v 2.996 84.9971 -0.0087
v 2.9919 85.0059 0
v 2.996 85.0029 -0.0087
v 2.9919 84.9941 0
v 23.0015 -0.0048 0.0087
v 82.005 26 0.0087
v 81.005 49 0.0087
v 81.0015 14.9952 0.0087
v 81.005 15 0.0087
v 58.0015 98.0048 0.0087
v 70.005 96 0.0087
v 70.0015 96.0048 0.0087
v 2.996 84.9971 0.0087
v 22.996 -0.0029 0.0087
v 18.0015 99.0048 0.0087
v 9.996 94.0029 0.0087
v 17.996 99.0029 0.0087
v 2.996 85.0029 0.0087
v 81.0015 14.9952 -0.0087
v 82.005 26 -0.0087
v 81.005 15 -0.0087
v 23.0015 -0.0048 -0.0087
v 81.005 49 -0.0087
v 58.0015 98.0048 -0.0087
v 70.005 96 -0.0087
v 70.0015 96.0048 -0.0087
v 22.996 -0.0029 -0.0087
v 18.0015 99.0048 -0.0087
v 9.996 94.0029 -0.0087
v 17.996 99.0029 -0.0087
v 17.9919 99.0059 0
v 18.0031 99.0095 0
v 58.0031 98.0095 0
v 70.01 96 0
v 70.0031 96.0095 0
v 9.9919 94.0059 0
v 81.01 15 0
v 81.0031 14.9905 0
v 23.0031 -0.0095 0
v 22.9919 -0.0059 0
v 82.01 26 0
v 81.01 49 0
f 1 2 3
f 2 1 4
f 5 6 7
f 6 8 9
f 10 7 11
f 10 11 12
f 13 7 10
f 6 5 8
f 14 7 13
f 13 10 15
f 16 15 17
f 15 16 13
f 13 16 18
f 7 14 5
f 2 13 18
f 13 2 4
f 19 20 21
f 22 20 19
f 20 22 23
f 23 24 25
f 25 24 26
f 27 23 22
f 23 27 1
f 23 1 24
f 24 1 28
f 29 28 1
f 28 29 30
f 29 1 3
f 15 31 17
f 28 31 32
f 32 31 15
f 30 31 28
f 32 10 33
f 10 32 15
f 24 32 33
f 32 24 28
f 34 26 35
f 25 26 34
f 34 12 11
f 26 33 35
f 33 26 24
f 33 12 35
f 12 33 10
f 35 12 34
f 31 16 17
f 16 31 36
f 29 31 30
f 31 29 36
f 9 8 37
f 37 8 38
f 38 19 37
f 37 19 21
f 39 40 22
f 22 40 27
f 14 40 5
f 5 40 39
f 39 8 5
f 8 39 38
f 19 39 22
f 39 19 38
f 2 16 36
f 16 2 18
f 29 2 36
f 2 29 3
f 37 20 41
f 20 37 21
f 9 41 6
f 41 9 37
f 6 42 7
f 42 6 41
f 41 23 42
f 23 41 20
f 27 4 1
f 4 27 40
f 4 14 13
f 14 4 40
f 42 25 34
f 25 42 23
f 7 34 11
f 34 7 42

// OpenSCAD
color([0.3519350680925015,0.6477014615427978,0.14125726454845833]) hull(){
    translate([18,58]) sphere(0.01);
    translate([6,84]) sphere(0.01);
    translate([3,85]) sphere(0.01);
}
color([0.23013900541024712,0.8285218163248013,0.9603761550286747]) hull(){
    translate([18,58]) sphere(0.01);
    translate([6,84]) sphere(0.01);
    translate([16,79]) sphere(0.01);
}
color([0.6050710034948523,0.017553655236826726,0.43262871278032167]) hull(){
    translate([18,58]) sphere(0.01);
    translate([18,24]) sphere(0.01);
    translate([26,51]) sphere(0.01);
}
color([0.2571490251669072,0.4480229944680496,0.14517873337393172]) hull(){
    translate([18,58]) sphere(0.01);
    translate([18,24]) sphere(0.01);
    translate([3,85]) sphere(0.01);
}
color([0.8405131005933094,0.9776834869331054,0.10300019528175153]) hull(){
    translate([18,58]) sphere(0.01);
    translate([26,51]) sphere(0.01);
    translate([30,57]) sphere(0.01);
}
color([0.998153073210626,0.8535026464000083,0.6855970549077809]) hull(){
    translate([18,58]) sphere(0.01);
    translate([30,57]) sphere(0.01);
    translate([16,79]) sphere(0.01);
}
color([0.7995005100691247,0.34047238184459006,0.1286635278612125]) hull(){
    translate([58,98]) sphere(0.01);
    translate([50,93]) sphere(0.01);
    translate([39,98]) sphere(0.01);
}
color([0.6020598448119898,0.9167847797194366,0.02081986636819022]) hull(){
    translate([58,98]) sphere(0.01);
    translate([50,93]) sphere(0.01);
    translate([59,71]) sphere(0.01);
}
color([0.9135118305629362,0.3823609034395232,0.42581309278619206]) hull(){
    translate([58,98]) sphere(0.01);
    translate([39,98]) sphere(0.01);
    translate([18,99]) sphere(0.01);
}
color([0.08967296065919184,0.0016857337534631478,0.31287848776698257]) hull(){
    translate([58,98]) sphere(0.01);
    translate([59,71]) sphere(0.01);
    translate([70,96]) sphere(0.01);
}
color([0.09731792302828757,0.364404074066101,0.8754307508322564]) hull(){
    translate([22,90]) sphere(0.01);
    translate([10,94]) sphere(0.01);
    translate([20,83]) sphere(0.01);
}
color([0.6967090939923642,0.5776053806129825,0.18685318159950626]) hull(){
    translate([22,90]) sphere(0.01);
    translate([10,94]) sphere(0.01);
    translate([18,99]) sphere(0.01);
}
color([0.9585806736472646,0.593334846568766,0.09927504601217696]) hull(){
    translate([22,90]) sphere(0.01);
    translate([39,98]) sphere(0.01);
    translate([20,83]) sphere(0.01);
}
color([0.19313665173925,0.6863688301261038,0.2093263356404984]) hull(){
    translate([22,90]) sphere(0.01);
    translate([39,98]) sphere(0.01);
    translate([18,99]) sphere(0.01);
}
color([0.2694340379225941,0.24598969558588324,0.16092298384524362]) hull(){
    translate([50,93]) sphere(0.01);
    translate([39,98]) sphere(0.01);
    translate([20,83]) sphere(0.01);
}
color([0.5102606956149307,0.431705445139412,0.38909399282504675]) hull(){
    translate([50,93]) sphere(0.01);
    translate([59,71]) sphere(0.01);
    translate([20,83]) sphere(0.01);
}
color([0.3194819673674283,0.6655357355223767,0.22692357675811492]) hull(){
    translate([44,55]) sphere(0.01);
    translate([44,47]) sphere(0.01);
    translate([35,48]) sphere(0.01);
}
color([0.9464906820257937,0.35776616524050997,0.9421064453260054]) hull(){
    translate([44,55]) sphere(0.01);
    translate([44,47]) sphere(0.01);
    translate([77,50]) sphere(0.01);
}
color([0.3792404853118415,0.27508202782836655,0.9368074710650367]) hull(){
    translate([44,55]) sphere(0.01);
    translate([59,71]) sphere(0.01);
    translate([77,50]) sphere(0.01);
}
color([0.7670397757471089,0.17483880300164423,0.7474114244696689]) hull(){
    translate([44,55]) sphere(0.01);
    translate([59,71]) sphere(0.01);
    translate([30,57]) sphere(0.01);
}
color([0.6015236368594579,0.5872808850844162,0.28390336255679416]) hull(){
    translate([44,55]) sphere(0.01);
    translate([35,48]) sphere(0.01);
    translate([30,57]) sphere(0.01);
}
color([0.5839405385485582,0.4048698908705002,0.6877557316706271]) hull(){
    translate([64,14]) sphere(0.01);
    translate([68,15]) sphere(0.01);
    translate([81,15]) sphere(0.01);
}
color([0.29310936231965135,0.08456113000314536,0.6409271470126323]) hull(){
    translate([64,14]) sphere(0.01);
    translate([68,15]) sphere(0.01);
    translate([72,20]) sphere(0.01);
}
color([0.38512246522478266,0.6162859510128613,0.407224705538046]) hull(){
    translate([64,14]) sphere(0.01);
    translate([58,33]) sphere(0.01);
    translate([42,29]) sphere(0.01);
}
color([0.6107800780239486,0.9541913078580654,0.09369719926319908]) hull(){
    translate([64,14]) sphere(0.01);
    translate([58,33]) sphere(0.01);
    translate([72,20]) sphere(0.01);
}
color([0.4396226851829427,0.9817497074141792,0.30111933510979894]) hull(){
    translate([64,14]) sphere(0.01);
    translate([42,29]) sphere(0.01);
    translate([23,0]) sphere(0.01);
}
color([0.08571041628526821,0.691130580335744,0.16573157374072334]) hull(){
    translate([64,14]) sphere(0.01);
    translate([81,15]) sphere(0.01);
    translate([23,0]) sphere(0.01);
}
color([0.4668304924867862,0.30100213617539295,0.3511677492745029]) hull(){
    translate([68,15]) sphere(0.01);
    translate([81,15]) sphere(0.01);
    translate([72,20]) sphere(0.01);
}
color([0.05564944269037686,0.7696481469448815,0.686275624239137]) hull(){
    translate([10,94]) sphere(0.01);
    translate([6,84]) sphere(0.01);
    translate([20,83]) sphere(0.01);
}
color([0.15447252119296884,0.35335085758162643,0.18799175914388588]) hull(){
    translate([10,94]) sphere(0.01);
    translate([6,84]) sphere(0.01);
    translate([3,85]) sphere(0.01);
}
color([0.41322879780265653,0.82270842281296,0.9057146612667819]) hull(){
    translate([58,33]) sphere(0.01);
    translate([82,26]) sphere(0.01);
    translate([77,50]) sphere(0.01);
}
color([0.9688547633127277,0.5528378273263655,0.12760284187612392]) hull(){
    translate([58,33]) sphere(0.01);
    translate([82,26]) sphere(0.01);
    translate([72,20]) sphere(0.01);
}
color([0.1710979555253146,0.7131998843266452,0.6397779425125977]) hull(){
    translate([58,33]) sphere(0.01);
    translate([42,29]) sphere(0.01);
    translate([44,47]) sphere(0.01);
}
color([0.57496968906483,0.8489371230716904,0.07944838941339594]) hull(){
    translate([58,33]) sphere(0.01);
    translate([44,47]) sphere(0.01);
    translate([77,50]) sphere(0.01);
}
color([0.040333123224873146,0.9305910632054132,0.3080440975445232]) hull(){
    translate([6,84]) sphere(0.01);
    translate([20,83]) sphere(0.01);
    translate([16,79]) sphere(0.01);
}
color([0.6084655882345898,0.4923441190446234,0.7069385087242315]) hull(){
    translate([82,26]) sphere(0.01);
    translate([81,15]) sphere(0.01);
    translate([72,20]) sphere(0.01);
}
color([0.6803385961846494,0.18024793645131376,0.10787678186317007]) hull(){
    translate([82,26]) sphere(0.01);
    translate([77,50]) sphere(0.01);
    translate([81,49]) sphere(0.01);
}
color([0.1335624130282893,0.47731112778056706,0.8393950916733898]) hull(){
    translate([42,29]) sphere(0.01);
    translate([26,22]) sphere(0.01);
    translate([35,48]) sphere(0.01);
}
color([0.6780893207968227,0.08337096158279222,0.27725115680544954]) hull(){
    translate([42,29]) sphere(0.01);
    translate([26,22]) sphere(0.01);
    translate([23,0]) sphere(0.01);
}
color([0.9965791662073833,0.03375154870506614,0.10494976972159242]) hull(){
    translate([42,29]) sphere(0.01);
    translate([44,47]) sphere(0.01);
    translate([35,48]) sphere(0.01);
}
color([0.516844917539197,0.1360610465034362,0.543805910213663]) hull(){
    translate([26,22]) sphere(0.01);
    translate([18,24]) sphere(0.01);
    translate([26,51]) sphere(0.01);
}
color([0.04901628196141694,0.4867102513994055,0.8813892002857401]) hull(){
    translate([26,22]) sphere(0.01);
    translate([18,24]) sphere(0.01);
    translate([24,21]) sphere(0.01);
}
color([0.3053751014353143,0.40772022041766365,0.31297204198076634]) hull(){
    translate([26,22]) sphere(0.01);
    translate([26,51]) sphere(0.01);
    translate([35,48]) sphere(0.01);
}
color([0.49907796034366436,0.6160709555012981,0.9916538905911245]) hull(){
    translate([26,22]) sphere(0.01);
    translate([23,0]) sphere(0.01);
    translate([24,21]) sphere(0.01);
}
color([0.3123575451593331,0.46364206475662195,0.8862899719975306]) hull(){
    translate([18,24]) sphere(0.01);
    translate([23,0]) sphere(0.01);
    translate([24,21]) sphere(0.01);
}
color([0.5738800220993816,0.8494037217359881,0.24323676398212035]) hull(){
    translate([18,24]) sphere(0.01);
    translate([23,0]) sphere(0.01);
    translate([3,85]) sphere(0.01);
}
color([0.8402878098664139,0.9530478541805099,0.16594803365564914]) hull(){
    translate([80,52]) sphere(0.01);
    translate([59,71]) sphere(0.01);
    translate([77,50]) sphere(0.01);
}
color([0.0023370868964924796,0.7387895340607371,0.5374530602666081]) hull(){
    translate([80,52]) sphere(0.01);
    translate([59,71]) sphere(0.01);
    translate([70,96]) sphere(0.01);
}
color([0.25604025835089217,0.4320068924153808,0.5112453323210508]) hull(){
    translate([80,52]) sphere(0.01);
    translate([77,50]) sphere(0.01);
    translate([81,49]) sphere(0.01);
}
color([0.7462272619347637,0.5039790716190428,0.8850839351693509]) hull(){
    translate([80,52]) sphere(0.01);
    translate([81,49]) sphere(0.01);
    translate([70,96]) sphere(0.01);
}
color([0.6652757233710683,0.22263754843686523,0.08942086350367451]) hull(){
    translate([26,51]) sphere(0.01);
    translate([35,48]) sphere(0.01);
    translate([30,57]) sphere(0.01);
}
color([0.6195232841458308,0.9036720387350747,0.7222923954673625]) hull(){
    translate([59,71]) sphere(0.01);
    translate([20,83]) sphere(0.01);
    translate([30,57]) sphere(0.01);
}
color([0.6665075097113882,0.5421139713900744,0.6943978877819516]) hull(){
    translate([20,83]) sphere(0.01);
    translate([30,57]) sphere(0.01);
    translate([16,79]) sphere(0.01);
}
